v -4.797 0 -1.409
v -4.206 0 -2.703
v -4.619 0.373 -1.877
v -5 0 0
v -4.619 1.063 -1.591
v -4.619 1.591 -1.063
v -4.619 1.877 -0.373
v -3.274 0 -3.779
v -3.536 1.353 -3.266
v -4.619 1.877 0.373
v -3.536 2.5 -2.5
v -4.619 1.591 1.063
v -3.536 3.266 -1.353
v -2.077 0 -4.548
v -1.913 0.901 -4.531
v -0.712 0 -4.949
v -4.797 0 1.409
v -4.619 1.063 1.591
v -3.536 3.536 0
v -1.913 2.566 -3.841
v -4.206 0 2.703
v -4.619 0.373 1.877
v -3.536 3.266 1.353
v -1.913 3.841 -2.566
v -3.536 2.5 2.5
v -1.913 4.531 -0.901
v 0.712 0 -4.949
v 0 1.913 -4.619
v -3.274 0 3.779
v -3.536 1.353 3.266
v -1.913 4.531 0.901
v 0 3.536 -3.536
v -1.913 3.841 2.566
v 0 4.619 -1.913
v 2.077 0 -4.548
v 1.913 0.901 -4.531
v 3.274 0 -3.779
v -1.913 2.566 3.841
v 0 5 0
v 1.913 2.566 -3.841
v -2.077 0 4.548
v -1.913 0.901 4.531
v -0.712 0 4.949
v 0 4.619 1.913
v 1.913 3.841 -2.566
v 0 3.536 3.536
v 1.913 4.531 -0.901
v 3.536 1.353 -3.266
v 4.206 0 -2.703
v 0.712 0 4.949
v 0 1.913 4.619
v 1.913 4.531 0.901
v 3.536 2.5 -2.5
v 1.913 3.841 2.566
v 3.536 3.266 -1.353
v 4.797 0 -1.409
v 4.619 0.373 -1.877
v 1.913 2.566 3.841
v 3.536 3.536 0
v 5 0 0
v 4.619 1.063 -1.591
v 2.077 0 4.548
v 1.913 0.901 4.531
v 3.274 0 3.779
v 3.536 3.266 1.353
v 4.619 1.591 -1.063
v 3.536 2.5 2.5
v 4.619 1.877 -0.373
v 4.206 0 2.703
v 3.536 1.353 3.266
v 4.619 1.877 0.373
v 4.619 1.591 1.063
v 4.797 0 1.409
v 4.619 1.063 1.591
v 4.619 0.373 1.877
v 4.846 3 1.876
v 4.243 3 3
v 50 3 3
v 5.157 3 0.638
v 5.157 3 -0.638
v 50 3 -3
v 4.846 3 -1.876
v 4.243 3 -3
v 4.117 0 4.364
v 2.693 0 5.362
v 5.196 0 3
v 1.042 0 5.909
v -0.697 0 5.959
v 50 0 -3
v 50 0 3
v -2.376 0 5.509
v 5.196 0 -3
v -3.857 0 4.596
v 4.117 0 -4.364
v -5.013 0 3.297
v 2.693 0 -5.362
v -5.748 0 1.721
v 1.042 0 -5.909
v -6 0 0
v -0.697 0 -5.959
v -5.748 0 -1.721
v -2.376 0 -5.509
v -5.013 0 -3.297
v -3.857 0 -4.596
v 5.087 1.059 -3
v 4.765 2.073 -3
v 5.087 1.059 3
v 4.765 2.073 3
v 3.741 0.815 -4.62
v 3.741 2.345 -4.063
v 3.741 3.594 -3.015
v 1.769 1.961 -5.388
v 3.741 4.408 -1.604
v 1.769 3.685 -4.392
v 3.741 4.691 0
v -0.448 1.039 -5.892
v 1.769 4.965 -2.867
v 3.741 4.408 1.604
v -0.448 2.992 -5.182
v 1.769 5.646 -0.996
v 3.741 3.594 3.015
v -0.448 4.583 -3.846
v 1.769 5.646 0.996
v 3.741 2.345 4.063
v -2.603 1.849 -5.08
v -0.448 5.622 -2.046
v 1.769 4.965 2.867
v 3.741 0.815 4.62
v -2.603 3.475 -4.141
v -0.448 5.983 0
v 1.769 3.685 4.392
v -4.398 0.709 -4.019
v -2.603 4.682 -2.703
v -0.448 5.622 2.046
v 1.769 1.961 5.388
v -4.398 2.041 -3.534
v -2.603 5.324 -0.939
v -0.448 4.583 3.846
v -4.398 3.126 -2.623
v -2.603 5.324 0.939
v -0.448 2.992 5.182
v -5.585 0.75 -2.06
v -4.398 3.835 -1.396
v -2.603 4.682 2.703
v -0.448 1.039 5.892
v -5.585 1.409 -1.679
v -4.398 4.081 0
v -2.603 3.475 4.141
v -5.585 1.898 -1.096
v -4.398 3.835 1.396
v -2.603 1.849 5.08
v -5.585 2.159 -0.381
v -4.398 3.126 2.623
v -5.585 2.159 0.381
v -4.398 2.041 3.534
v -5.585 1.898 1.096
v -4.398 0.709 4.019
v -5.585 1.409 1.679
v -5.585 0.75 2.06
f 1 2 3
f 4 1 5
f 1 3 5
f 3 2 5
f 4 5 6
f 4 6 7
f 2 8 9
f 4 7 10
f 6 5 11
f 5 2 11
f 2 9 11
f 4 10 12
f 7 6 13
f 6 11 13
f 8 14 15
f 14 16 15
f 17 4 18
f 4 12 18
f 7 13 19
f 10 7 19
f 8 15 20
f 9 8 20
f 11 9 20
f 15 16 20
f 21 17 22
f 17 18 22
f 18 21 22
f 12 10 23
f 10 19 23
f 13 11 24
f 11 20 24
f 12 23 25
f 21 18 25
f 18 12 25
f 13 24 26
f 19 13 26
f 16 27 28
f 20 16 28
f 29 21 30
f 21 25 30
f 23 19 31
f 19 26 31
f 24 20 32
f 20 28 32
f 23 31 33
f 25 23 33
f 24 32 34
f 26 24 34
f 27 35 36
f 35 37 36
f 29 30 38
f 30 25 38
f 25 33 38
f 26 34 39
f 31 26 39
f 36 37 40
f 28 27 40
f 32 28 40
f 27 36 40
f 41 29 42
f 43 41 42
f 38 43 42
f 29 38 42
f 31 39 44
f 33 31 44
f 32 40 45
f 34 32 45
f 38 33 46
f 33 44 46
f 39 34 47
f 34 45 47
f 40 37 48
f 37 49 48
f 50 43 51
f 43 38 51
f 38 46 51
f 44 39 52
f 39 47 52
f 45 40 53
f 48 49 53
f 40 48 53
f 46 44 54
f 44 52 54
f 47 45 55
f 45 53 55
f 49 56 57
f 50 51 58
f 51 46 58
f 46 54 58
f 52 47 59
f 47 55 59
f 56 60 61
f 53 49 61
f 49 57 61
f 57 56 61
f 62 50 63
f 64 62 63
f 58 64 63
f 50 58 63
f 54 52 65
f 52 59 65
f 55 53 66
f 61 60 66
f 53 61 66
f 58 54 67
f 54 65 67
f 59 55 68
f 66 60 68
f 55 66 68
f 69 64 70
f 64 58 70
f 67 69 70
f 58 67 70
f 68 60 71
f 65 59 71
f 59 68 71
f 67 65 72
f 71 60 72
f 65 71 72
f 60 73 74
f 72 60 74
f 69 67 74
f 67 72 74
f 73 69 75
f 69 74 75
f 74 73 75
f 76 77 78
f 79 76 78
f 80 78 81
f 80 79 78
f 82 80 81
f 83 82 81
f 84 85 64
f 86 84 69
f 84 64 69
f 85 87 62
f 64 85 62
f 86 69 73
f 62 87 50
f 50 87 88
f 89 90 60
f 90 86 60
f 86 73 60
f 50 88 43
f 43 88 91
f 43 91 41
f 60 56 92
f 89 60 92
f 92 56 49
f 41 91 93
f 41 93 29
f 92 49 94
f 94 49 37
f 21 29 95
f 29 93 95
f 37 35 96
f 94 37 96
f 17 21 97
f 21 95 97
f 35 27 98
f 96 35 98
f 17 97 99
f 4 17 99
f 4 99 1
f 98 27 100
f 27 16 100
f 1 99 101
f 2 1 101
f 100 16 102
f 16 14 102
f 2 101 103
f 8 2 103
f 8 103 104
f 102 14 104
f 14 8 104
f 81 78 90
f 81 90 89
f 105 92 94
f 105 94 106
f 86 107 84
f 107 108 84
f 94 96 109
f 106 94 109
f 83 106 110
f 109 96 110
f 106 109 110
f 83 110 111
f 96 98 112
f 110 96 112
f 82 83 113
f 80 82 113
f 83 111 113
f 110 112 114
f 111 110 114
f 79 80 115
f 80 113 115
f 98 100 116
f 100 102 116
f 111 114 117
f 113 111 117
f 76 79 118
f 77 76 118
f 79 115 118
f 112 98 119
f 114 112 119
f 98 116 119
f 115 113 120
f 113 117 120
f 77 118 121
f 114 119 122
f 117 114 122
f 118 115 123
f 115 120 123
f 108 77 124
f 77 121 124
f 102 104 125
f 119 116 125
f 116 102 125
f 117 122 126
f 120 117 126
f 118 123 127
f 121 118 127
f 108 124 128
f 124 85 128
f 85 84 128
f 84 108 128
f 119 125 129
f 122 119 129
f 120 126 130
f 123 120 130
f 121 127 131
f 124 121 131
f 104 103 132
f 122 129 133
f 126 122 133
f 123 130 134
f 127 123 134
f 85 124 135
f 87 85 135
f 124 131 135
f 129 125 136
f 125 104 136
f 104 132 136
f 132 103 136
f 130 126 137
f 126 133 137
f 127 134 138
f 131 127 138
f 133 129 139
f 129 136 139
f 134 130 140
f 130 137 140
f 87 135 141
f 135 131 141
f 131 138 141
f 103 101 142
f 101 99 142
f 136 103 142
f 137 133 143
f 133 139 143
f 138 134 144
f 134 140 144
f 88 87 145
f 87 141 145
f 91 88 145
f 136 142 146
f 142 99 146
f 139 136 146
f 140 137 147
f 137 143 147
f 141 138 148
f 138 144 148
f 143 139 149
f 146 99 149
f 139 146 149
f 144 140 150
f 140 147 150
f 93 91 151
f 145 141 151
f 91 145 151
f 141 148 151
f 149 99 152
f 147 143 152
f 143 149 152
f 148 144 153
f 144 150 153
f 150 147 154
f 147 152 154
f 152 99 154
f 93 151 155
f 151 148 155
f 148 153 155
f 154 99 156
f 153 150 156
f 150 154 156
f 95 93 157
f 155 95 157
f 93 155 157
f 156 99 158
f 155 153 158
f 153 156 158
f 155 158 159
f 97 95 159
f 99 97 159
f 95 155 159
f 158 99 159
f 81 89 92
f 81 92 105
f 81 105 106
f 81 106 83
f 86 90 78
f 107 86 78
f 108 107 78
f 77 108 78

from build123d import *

# Parameters (mm, degrees)
REVOLVE1_ANGLE                  = 180
BOSS_EXTRUDE1_REACH             = 20.111
BOSS_EXTRUDE1_END_RADIUS        = 6
SKETCH2_W                       = 6
SKETCH2_H                       = 3
BOSS_EXTRUDE1_DIRECTION_2_DEPTH = 40


with BuildPart() as part:
    # Sketch1 → Revolve1 (revolve)
    with BuildSketch(Plane(origin=(0, 0, 0), x_dir=(1, 0, 0), z_dir=(0, 1, 0))):
        with BuildLine():
            Line((-6, 0), (-5, 0))
            ThreePointArc((-5, 0), (0, 5), (5, 0))
            Line((5, 0), (6, 0))
            ThreePointArc((6, 0), (0, 6), (-6, 0))
        make_face()
    revolve(axis=Axis((-6, 0, 0), (1, 0, 0)), revolution_arc=REVOLVE1_ANGLE)

    # Boss-Extrude1: up to this sphere (the profile starts outside it)
    boss_extrude1_end = Location((0, 0, 0)) * Sphere(BOSS_EXTRUDE1_END_RADIUS, mode=Mode.PRIVATE)
    # Sketch2 → Boss-Extrude1 (add, up to the surface)
    with BuildSketch(Plane(origin=(10, 0, 0), x_dir=(0, 0, -1), z_dir=(1, 0, 0)), mode=Mode.PRIVATE) as boss_extrude1_sk1:
        with Locations((0, 1.5)):
            Rectangle(SKETCH2_W, SKETCH2_H)
    boss_extrude1_tool1 = extrude(boss_extrude1_sk1.sketch, amount=-BOSS_EXTRUDE1_REACH, mode=Mode.PRIVATE) - boss_extrude1_end
    add(boss_extrude1_tool1.solids().sort_by_distance((10, 1.5, 0))[0])

    # Sketch2 → Boss-Extrude1 direction 2 (add)
    with BuildSketch(Plane(origin=(10, 0, 0), x_dir=(0, 0, -1), z_dir=(1, 0, 0))):
        with Locations((0, 1.5)):
            Rectangle(SKETCH2_W, SKETCH2_H)
    extrude(amount=BOSS_EXTRUDE1_DIRECTION_2_DEPTH)


solid = part.part
